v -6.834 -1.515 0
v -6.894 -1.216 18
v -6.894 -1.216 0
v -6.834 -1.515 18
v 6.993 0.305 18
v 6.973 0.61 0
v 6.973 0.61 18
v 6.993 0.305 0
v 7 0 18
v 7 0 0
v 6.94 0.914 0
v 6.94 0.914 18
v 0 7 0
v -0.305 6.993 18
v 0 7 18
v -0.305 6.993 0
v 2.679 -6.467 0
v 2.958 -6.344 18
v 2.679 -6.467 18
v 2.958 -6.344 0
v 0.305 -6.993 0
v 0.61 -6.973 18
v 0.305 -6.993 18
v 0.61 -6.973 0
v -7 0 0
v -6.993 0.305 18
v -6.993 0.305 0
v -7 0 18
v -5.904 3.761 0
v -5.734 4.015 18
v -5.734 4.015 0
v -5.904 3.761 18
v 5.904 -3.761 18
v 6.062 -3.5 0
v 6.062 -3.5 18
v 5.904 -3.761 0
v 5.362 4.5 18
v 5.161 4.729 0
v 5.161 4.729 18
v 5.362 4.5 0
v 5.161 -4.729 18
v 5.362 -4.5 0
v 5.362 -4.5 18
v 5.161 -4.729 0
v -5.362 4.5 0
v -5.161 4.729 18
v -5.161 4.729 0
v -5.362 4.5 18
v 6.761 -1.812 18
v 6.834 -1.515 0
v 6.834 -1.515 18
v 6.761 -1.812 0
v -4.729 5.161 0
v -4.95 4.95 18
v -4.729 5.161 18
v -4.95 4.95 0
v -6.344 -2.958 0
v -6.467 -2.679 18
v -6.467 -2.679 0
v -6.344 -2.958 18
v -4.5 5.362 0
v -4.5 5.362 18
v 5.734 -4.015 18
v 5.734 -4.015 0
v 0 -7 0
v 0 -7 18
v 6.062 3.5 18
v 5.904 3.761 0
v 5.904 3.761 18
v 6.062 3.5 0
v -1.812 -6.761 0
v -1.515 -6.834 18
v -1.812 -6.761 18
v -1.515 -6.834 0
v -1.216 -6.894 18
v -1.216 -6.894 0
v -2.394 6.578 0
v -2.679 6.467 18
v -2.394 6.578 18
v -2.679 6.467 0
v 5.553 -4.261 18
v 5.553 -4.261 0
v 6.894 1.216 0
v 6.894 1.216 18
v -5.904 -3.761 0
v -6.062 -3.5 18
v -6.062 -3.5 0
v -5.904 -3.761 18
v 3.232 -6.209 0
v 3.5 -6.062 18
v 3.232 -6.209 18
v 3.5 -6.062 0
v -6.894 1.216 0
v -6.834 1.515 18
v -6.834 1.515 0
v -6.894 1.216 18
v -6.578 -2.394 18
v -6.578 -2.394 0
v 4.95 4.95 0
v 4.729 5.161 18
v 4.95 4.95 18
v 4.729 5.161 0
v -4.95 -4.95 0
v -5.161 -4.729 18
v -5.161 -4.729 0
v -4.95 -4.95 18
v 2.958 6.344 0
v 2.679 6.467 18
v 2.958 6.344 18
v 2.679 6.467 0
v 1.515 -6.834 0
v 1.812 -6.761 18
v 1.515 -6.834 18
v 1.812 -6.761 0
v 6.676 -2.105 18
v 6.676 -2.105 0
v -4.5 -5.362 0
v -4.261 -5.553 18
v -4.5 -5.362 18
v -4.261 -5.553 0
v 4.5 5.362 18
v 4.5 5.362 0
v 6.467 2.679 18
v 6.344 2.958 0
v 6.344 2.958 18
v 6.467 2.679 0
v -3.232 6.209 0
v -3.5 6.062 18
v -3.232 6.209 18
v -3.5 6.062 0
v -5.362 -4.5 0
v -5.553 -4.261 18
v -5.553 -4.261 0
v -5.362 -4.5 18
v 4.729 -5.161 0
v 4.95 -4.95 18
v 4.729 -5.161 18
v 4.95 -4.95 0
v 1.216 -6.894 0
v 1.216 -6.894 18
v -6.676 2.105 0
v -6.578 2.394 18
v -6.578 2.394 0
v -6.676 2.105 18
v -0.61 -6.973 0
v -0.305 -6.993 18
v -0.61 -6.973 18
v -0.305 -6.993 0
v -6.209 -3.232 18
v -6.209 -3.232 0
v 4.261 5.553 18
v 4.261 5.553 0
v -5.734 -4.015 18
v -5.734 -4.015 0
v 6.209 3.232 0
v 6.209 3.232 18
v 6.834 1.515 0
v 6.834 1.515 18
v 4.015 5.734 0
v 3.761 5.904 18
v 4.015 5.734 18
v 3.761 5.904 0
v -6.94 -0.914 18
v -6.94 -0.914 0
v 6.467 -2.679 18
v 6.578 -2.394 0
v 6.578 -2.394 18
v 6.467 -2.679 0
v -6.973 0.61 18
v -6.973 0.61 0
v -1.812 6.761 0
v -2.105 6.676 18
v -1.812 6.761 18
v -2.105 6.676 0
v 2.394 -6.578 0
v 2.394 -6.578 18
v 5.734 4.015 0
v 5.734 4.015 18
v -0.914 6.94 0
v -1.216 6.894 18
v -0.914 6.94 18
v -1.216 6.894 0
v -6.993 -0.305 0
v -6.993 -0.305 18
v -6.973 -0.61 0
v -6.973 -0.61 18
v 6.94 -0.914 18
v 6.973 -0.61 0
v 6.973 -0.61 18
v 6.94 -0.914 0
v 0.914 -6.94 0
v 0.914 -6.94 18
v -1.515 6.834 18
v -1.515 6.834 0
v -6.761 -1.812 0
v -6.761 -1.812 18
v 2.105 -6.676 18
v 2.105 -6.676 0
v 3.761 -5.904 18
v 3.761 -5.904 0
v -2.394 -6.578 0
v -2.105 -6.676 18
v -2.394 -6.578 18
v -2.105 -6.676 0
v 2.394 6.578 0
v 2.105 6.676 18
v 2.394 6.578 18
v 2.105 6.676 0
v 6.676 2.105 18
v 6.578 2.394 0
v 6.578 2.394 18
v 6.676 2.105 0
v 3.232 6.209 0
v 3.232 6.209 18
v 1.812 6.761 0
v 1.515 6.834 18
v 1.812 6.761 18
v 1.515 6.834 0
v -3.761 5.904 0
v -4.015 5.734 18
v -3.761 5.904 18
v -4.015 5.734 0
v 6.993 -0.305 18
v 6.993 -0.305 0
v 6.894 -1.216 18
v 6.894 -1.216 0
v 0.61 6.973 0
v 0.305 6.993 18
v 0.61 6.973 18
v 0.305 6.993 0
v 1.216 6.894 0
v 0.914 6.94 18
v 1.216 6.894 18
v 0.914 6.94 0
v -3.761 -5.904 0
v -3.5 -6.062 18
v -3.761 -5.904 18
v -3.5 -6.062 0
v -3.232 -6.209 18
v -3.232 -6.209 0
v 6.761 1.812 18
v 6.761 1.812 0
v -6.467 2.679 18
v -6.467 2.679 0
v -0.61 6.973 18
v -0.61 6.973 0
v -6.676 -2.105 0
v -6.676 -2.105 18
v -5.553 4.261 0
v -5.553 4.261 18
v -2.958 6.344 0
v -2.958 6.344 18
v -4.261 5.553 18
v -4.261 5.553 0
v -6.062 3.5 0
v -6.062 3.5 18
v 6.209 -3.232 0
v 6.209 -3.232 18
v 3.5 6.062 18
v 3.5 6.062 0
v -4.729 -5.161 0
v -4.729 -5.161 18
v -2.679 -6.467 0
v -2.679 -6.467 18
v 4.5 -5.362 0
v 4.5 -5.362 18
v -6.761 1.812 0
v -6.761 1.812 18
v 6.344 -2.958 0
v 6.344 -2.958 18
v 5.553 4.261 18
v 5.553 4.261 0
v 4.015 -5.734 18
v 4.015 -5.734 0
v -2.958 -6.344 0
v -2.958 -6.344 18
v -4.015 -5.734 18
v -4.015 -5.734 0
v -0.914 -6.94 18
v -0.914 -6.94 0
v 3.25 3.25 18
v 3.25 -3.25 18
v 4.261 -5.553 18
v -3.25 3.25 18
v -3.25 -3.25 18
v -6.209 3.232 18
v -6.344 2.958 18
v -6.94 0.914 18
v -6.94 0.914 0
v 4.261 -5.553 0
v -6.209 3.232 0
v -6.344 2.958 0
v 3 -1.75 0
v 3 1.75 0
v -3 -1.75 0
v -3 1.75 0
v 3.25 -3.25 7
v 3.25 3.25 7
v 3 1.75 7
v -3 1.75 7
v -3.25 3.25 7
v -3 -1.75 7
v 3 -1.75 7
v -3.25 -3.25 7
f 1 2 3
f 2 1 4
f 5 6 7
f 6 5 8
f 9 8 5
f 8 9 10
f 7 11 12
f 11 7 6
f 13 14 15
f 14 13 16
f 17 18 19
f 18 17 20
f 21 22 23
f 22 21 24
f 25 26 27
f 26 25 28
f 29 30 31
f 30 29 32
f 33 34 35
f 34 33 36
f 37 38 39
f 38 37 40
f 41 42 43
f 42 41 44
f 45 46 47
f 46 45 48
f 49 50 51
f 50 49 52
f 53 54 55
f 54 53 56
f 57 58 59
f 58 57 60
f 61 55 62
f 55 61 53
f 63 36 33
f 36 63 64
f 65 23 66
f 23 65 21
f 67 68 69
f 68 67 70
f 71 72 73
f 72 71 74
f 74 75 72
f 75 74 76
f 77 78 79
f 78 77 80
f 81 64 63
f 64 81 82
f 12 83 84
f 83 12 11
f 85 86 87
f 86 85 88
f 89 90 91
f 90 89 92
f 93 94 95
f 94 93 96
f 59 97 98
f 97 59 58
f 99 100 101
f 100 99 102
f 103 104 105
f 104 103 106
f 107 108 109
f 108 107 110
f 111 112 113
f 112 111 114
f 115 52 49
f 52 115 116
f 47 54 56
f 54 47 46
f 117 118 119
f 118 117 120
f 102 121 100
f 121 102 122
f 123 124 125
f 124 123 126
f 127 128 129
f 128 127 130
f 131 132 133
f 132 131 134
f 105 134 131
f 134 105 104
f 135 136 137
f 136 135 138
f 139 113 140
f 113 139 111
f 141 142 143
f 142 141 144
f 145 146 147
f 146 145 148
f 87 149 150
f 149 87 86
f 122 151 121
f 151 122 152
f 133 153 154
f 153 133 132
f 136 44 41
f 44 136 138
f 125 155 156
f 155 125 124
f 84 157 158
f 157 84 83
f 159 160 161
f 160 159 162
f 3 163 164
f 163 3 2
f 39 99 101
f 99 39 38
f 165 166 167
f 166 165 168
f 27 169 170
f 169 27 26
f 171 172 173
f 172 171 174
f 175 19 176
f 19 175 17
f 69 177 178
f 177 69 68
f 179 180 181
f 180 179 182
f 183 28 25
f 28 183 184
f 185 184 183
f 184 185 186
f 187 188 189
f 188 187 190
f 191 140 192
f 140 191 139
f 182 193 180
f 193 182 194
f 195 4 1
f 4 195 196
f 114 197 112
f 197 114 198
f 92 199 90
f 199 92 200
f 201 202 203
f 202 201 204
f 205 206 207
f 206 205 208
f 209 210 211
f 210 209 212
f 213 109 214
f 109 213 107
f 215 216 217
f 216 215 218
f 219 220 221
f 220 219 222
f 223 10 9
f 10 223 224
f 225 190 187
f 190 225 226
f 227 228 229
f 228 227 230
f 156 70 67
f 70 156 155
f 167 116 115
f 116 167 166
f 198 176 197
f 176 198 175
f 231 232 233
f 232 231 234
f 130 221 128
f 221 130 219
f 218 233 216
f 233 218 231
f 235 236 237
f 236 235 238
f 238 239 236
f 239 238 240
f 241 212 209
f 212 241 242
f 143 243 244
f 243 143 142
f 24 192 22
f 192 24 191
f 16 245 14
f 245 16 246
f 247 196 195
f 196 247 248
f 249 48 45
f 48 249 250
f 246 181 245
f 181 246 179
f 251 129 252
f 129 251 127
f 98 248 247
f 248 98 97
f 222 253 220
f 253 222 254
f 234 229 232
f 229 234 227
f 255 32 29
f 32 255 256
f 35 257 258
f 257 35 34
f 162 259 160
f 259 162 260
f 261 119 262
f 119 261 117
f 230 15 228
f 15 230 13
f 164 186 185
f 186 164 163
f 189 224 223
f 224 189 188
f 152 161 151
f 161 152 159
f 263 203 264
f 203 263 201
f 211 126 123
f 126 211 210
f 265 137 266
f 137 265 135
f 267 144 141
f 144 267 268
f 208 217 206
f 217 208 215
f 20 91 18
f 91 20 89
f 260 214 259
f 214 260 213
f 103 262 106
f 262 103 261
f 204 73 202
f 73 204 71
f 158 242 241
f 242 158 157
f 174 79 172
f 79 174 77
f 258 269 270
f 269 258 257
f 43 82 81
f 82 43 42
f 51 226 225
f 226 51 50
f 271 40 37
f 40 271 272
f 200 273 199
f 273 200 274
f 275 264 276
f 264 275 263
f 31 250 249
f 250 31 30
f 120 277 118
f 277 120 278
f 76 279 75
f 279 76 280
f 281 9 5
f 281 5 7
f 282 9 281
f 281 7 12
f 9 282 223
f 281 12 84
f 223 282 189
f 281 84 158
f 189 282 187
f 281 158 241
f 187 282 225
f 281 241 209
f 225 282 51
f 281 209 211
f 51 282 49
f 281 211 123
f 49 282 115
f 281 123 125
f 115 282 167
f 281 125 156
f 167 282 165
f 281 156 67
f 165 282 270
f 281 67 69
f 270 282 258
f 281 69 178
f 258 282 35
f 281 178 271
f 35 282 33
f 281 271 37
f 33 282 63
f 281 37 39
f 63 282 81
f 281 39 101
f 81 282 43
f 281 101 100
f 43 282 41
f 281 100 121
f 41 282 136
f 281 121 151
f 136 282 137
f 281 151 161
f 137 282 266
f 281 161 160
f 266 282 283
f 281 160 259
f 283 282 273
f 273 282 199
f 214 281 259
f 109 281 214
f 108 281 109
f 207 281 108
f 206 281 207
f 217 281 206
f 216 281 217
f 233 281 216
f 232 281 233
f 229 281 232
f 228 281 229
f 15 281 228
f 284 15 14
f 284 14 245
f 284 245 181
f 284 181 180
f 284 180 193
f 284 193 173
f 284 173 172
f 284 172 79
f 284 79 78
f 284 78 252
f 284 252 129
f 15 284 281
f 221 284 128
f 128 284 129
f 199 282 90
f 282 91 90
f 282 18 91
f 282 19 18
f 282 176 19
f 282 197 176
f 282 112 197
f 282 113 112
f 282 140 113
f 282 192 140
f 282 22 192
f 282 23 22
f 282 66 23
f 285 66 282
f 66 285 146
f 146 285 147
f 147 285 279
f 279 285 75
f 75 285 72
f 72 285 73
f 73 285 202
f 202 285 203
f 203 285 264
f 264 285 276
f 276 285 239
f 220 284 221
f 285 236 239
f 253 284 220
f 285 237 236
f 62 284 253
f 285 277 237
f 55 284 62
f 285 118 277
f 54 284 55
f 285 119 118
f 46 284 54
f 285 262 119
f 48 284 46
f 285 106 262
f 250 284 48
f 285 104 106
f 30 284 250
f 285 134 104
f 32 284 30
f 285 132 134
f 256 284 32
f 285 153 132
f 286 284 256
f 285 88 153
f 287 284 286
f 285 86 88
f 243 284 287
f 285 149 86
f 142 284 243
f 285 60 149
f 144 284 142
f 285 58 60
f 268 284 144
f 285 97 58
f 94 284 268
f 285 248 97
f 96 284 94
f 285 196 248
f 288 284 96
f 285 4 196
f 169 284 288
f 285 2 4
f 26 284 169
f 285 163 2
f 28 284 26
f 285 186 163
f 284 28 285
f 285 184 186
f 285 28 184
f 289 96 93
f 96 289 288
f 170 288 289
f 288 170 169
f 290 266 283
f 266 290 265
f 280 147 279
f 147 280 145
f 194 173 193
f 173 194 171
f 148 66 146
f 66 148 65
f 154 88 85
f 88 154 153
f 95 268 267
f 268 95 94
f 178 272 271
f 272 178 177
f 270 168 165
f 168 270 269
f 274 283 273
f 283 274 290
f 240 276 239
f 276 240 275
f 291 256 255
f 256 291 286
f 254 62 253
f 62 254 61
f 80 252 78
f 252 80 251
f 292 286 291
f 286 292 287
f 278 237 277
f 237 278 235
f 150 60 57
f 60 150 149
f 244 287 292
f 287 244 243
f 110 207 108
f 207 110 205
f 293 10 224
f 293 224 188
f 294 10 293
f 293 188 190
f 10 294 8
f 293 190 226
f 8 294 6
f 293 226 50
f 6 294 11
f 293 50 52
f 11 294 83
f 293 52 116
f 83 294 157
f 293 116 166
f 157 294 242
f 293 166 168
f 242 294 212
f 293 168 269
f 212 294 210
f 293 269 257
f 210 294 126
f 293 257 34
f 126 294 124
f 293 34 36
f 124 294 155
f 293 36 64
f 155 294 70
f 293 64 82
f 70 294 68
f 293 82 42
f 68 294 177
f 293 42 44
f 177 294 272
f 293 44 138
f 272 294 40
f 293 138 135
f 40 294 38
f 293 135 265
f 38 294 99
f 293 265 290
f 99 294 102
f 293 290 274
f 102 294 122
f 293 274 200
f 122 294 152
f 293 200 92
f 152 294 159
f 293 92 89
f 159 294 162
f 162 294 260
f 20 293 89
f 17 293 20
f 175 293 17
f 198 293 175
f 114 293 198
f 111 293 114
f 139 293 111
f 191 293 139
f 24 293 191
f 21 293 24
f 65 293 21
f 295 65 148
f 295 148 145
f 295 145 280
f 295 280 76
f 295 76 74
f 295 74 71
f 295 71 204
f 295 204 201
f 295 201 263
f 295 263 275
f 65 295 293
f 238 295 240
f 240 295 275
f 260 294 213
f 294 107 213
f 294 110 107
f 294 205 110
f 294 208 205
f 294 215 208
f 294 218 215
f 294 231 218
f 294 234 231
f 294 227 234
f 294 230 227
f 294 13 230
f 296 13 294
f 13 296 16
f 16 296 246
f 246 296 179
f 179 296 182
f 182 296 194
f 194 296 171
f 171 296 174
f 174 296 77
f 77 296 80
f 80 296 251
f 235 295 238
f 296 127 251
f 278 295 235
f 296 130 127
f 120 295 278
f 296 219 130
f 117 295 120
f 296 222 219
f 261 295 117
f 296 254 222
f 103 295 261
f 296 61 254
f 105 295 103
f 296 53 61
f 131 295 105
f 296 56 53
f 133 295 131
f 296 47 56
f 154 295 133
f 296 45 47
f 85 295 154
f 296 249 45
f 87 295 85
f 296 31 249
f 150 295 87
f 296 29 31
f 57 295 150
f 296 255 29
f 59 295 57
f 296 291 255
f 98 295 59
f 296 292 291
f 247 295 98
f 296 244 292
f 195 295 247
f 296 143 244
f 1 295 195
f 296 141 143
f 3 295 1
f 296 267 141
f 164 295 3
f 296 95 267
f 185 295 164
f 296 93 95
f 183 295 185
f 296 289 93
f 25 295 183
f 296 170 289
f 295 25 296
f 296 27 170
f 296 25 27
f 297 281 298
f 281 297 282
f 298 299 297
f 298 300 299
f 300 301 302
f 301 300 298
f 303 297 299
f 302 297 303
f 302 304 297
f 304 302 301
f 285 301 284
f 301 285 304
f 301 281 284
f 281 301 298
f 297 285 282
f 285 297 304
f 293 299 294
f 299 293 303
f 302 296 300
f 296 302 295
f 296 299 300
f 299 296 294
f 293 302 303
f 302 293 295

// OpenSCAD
$fn=144;

shaft_diameter = 6.5;

difference() {
    cylinder(18, 7, 7);
    
    //Blinds shaft
    translate([-shaft_diameter/2, -shaft_diameter/2, 7])
        cube([shaft_diameter, shaft_diameter, 11]);
    
    // Motor shaft
    translate([-6/2, -3.5/2, 0])
        cube([6, 3.5, 7]);
};
